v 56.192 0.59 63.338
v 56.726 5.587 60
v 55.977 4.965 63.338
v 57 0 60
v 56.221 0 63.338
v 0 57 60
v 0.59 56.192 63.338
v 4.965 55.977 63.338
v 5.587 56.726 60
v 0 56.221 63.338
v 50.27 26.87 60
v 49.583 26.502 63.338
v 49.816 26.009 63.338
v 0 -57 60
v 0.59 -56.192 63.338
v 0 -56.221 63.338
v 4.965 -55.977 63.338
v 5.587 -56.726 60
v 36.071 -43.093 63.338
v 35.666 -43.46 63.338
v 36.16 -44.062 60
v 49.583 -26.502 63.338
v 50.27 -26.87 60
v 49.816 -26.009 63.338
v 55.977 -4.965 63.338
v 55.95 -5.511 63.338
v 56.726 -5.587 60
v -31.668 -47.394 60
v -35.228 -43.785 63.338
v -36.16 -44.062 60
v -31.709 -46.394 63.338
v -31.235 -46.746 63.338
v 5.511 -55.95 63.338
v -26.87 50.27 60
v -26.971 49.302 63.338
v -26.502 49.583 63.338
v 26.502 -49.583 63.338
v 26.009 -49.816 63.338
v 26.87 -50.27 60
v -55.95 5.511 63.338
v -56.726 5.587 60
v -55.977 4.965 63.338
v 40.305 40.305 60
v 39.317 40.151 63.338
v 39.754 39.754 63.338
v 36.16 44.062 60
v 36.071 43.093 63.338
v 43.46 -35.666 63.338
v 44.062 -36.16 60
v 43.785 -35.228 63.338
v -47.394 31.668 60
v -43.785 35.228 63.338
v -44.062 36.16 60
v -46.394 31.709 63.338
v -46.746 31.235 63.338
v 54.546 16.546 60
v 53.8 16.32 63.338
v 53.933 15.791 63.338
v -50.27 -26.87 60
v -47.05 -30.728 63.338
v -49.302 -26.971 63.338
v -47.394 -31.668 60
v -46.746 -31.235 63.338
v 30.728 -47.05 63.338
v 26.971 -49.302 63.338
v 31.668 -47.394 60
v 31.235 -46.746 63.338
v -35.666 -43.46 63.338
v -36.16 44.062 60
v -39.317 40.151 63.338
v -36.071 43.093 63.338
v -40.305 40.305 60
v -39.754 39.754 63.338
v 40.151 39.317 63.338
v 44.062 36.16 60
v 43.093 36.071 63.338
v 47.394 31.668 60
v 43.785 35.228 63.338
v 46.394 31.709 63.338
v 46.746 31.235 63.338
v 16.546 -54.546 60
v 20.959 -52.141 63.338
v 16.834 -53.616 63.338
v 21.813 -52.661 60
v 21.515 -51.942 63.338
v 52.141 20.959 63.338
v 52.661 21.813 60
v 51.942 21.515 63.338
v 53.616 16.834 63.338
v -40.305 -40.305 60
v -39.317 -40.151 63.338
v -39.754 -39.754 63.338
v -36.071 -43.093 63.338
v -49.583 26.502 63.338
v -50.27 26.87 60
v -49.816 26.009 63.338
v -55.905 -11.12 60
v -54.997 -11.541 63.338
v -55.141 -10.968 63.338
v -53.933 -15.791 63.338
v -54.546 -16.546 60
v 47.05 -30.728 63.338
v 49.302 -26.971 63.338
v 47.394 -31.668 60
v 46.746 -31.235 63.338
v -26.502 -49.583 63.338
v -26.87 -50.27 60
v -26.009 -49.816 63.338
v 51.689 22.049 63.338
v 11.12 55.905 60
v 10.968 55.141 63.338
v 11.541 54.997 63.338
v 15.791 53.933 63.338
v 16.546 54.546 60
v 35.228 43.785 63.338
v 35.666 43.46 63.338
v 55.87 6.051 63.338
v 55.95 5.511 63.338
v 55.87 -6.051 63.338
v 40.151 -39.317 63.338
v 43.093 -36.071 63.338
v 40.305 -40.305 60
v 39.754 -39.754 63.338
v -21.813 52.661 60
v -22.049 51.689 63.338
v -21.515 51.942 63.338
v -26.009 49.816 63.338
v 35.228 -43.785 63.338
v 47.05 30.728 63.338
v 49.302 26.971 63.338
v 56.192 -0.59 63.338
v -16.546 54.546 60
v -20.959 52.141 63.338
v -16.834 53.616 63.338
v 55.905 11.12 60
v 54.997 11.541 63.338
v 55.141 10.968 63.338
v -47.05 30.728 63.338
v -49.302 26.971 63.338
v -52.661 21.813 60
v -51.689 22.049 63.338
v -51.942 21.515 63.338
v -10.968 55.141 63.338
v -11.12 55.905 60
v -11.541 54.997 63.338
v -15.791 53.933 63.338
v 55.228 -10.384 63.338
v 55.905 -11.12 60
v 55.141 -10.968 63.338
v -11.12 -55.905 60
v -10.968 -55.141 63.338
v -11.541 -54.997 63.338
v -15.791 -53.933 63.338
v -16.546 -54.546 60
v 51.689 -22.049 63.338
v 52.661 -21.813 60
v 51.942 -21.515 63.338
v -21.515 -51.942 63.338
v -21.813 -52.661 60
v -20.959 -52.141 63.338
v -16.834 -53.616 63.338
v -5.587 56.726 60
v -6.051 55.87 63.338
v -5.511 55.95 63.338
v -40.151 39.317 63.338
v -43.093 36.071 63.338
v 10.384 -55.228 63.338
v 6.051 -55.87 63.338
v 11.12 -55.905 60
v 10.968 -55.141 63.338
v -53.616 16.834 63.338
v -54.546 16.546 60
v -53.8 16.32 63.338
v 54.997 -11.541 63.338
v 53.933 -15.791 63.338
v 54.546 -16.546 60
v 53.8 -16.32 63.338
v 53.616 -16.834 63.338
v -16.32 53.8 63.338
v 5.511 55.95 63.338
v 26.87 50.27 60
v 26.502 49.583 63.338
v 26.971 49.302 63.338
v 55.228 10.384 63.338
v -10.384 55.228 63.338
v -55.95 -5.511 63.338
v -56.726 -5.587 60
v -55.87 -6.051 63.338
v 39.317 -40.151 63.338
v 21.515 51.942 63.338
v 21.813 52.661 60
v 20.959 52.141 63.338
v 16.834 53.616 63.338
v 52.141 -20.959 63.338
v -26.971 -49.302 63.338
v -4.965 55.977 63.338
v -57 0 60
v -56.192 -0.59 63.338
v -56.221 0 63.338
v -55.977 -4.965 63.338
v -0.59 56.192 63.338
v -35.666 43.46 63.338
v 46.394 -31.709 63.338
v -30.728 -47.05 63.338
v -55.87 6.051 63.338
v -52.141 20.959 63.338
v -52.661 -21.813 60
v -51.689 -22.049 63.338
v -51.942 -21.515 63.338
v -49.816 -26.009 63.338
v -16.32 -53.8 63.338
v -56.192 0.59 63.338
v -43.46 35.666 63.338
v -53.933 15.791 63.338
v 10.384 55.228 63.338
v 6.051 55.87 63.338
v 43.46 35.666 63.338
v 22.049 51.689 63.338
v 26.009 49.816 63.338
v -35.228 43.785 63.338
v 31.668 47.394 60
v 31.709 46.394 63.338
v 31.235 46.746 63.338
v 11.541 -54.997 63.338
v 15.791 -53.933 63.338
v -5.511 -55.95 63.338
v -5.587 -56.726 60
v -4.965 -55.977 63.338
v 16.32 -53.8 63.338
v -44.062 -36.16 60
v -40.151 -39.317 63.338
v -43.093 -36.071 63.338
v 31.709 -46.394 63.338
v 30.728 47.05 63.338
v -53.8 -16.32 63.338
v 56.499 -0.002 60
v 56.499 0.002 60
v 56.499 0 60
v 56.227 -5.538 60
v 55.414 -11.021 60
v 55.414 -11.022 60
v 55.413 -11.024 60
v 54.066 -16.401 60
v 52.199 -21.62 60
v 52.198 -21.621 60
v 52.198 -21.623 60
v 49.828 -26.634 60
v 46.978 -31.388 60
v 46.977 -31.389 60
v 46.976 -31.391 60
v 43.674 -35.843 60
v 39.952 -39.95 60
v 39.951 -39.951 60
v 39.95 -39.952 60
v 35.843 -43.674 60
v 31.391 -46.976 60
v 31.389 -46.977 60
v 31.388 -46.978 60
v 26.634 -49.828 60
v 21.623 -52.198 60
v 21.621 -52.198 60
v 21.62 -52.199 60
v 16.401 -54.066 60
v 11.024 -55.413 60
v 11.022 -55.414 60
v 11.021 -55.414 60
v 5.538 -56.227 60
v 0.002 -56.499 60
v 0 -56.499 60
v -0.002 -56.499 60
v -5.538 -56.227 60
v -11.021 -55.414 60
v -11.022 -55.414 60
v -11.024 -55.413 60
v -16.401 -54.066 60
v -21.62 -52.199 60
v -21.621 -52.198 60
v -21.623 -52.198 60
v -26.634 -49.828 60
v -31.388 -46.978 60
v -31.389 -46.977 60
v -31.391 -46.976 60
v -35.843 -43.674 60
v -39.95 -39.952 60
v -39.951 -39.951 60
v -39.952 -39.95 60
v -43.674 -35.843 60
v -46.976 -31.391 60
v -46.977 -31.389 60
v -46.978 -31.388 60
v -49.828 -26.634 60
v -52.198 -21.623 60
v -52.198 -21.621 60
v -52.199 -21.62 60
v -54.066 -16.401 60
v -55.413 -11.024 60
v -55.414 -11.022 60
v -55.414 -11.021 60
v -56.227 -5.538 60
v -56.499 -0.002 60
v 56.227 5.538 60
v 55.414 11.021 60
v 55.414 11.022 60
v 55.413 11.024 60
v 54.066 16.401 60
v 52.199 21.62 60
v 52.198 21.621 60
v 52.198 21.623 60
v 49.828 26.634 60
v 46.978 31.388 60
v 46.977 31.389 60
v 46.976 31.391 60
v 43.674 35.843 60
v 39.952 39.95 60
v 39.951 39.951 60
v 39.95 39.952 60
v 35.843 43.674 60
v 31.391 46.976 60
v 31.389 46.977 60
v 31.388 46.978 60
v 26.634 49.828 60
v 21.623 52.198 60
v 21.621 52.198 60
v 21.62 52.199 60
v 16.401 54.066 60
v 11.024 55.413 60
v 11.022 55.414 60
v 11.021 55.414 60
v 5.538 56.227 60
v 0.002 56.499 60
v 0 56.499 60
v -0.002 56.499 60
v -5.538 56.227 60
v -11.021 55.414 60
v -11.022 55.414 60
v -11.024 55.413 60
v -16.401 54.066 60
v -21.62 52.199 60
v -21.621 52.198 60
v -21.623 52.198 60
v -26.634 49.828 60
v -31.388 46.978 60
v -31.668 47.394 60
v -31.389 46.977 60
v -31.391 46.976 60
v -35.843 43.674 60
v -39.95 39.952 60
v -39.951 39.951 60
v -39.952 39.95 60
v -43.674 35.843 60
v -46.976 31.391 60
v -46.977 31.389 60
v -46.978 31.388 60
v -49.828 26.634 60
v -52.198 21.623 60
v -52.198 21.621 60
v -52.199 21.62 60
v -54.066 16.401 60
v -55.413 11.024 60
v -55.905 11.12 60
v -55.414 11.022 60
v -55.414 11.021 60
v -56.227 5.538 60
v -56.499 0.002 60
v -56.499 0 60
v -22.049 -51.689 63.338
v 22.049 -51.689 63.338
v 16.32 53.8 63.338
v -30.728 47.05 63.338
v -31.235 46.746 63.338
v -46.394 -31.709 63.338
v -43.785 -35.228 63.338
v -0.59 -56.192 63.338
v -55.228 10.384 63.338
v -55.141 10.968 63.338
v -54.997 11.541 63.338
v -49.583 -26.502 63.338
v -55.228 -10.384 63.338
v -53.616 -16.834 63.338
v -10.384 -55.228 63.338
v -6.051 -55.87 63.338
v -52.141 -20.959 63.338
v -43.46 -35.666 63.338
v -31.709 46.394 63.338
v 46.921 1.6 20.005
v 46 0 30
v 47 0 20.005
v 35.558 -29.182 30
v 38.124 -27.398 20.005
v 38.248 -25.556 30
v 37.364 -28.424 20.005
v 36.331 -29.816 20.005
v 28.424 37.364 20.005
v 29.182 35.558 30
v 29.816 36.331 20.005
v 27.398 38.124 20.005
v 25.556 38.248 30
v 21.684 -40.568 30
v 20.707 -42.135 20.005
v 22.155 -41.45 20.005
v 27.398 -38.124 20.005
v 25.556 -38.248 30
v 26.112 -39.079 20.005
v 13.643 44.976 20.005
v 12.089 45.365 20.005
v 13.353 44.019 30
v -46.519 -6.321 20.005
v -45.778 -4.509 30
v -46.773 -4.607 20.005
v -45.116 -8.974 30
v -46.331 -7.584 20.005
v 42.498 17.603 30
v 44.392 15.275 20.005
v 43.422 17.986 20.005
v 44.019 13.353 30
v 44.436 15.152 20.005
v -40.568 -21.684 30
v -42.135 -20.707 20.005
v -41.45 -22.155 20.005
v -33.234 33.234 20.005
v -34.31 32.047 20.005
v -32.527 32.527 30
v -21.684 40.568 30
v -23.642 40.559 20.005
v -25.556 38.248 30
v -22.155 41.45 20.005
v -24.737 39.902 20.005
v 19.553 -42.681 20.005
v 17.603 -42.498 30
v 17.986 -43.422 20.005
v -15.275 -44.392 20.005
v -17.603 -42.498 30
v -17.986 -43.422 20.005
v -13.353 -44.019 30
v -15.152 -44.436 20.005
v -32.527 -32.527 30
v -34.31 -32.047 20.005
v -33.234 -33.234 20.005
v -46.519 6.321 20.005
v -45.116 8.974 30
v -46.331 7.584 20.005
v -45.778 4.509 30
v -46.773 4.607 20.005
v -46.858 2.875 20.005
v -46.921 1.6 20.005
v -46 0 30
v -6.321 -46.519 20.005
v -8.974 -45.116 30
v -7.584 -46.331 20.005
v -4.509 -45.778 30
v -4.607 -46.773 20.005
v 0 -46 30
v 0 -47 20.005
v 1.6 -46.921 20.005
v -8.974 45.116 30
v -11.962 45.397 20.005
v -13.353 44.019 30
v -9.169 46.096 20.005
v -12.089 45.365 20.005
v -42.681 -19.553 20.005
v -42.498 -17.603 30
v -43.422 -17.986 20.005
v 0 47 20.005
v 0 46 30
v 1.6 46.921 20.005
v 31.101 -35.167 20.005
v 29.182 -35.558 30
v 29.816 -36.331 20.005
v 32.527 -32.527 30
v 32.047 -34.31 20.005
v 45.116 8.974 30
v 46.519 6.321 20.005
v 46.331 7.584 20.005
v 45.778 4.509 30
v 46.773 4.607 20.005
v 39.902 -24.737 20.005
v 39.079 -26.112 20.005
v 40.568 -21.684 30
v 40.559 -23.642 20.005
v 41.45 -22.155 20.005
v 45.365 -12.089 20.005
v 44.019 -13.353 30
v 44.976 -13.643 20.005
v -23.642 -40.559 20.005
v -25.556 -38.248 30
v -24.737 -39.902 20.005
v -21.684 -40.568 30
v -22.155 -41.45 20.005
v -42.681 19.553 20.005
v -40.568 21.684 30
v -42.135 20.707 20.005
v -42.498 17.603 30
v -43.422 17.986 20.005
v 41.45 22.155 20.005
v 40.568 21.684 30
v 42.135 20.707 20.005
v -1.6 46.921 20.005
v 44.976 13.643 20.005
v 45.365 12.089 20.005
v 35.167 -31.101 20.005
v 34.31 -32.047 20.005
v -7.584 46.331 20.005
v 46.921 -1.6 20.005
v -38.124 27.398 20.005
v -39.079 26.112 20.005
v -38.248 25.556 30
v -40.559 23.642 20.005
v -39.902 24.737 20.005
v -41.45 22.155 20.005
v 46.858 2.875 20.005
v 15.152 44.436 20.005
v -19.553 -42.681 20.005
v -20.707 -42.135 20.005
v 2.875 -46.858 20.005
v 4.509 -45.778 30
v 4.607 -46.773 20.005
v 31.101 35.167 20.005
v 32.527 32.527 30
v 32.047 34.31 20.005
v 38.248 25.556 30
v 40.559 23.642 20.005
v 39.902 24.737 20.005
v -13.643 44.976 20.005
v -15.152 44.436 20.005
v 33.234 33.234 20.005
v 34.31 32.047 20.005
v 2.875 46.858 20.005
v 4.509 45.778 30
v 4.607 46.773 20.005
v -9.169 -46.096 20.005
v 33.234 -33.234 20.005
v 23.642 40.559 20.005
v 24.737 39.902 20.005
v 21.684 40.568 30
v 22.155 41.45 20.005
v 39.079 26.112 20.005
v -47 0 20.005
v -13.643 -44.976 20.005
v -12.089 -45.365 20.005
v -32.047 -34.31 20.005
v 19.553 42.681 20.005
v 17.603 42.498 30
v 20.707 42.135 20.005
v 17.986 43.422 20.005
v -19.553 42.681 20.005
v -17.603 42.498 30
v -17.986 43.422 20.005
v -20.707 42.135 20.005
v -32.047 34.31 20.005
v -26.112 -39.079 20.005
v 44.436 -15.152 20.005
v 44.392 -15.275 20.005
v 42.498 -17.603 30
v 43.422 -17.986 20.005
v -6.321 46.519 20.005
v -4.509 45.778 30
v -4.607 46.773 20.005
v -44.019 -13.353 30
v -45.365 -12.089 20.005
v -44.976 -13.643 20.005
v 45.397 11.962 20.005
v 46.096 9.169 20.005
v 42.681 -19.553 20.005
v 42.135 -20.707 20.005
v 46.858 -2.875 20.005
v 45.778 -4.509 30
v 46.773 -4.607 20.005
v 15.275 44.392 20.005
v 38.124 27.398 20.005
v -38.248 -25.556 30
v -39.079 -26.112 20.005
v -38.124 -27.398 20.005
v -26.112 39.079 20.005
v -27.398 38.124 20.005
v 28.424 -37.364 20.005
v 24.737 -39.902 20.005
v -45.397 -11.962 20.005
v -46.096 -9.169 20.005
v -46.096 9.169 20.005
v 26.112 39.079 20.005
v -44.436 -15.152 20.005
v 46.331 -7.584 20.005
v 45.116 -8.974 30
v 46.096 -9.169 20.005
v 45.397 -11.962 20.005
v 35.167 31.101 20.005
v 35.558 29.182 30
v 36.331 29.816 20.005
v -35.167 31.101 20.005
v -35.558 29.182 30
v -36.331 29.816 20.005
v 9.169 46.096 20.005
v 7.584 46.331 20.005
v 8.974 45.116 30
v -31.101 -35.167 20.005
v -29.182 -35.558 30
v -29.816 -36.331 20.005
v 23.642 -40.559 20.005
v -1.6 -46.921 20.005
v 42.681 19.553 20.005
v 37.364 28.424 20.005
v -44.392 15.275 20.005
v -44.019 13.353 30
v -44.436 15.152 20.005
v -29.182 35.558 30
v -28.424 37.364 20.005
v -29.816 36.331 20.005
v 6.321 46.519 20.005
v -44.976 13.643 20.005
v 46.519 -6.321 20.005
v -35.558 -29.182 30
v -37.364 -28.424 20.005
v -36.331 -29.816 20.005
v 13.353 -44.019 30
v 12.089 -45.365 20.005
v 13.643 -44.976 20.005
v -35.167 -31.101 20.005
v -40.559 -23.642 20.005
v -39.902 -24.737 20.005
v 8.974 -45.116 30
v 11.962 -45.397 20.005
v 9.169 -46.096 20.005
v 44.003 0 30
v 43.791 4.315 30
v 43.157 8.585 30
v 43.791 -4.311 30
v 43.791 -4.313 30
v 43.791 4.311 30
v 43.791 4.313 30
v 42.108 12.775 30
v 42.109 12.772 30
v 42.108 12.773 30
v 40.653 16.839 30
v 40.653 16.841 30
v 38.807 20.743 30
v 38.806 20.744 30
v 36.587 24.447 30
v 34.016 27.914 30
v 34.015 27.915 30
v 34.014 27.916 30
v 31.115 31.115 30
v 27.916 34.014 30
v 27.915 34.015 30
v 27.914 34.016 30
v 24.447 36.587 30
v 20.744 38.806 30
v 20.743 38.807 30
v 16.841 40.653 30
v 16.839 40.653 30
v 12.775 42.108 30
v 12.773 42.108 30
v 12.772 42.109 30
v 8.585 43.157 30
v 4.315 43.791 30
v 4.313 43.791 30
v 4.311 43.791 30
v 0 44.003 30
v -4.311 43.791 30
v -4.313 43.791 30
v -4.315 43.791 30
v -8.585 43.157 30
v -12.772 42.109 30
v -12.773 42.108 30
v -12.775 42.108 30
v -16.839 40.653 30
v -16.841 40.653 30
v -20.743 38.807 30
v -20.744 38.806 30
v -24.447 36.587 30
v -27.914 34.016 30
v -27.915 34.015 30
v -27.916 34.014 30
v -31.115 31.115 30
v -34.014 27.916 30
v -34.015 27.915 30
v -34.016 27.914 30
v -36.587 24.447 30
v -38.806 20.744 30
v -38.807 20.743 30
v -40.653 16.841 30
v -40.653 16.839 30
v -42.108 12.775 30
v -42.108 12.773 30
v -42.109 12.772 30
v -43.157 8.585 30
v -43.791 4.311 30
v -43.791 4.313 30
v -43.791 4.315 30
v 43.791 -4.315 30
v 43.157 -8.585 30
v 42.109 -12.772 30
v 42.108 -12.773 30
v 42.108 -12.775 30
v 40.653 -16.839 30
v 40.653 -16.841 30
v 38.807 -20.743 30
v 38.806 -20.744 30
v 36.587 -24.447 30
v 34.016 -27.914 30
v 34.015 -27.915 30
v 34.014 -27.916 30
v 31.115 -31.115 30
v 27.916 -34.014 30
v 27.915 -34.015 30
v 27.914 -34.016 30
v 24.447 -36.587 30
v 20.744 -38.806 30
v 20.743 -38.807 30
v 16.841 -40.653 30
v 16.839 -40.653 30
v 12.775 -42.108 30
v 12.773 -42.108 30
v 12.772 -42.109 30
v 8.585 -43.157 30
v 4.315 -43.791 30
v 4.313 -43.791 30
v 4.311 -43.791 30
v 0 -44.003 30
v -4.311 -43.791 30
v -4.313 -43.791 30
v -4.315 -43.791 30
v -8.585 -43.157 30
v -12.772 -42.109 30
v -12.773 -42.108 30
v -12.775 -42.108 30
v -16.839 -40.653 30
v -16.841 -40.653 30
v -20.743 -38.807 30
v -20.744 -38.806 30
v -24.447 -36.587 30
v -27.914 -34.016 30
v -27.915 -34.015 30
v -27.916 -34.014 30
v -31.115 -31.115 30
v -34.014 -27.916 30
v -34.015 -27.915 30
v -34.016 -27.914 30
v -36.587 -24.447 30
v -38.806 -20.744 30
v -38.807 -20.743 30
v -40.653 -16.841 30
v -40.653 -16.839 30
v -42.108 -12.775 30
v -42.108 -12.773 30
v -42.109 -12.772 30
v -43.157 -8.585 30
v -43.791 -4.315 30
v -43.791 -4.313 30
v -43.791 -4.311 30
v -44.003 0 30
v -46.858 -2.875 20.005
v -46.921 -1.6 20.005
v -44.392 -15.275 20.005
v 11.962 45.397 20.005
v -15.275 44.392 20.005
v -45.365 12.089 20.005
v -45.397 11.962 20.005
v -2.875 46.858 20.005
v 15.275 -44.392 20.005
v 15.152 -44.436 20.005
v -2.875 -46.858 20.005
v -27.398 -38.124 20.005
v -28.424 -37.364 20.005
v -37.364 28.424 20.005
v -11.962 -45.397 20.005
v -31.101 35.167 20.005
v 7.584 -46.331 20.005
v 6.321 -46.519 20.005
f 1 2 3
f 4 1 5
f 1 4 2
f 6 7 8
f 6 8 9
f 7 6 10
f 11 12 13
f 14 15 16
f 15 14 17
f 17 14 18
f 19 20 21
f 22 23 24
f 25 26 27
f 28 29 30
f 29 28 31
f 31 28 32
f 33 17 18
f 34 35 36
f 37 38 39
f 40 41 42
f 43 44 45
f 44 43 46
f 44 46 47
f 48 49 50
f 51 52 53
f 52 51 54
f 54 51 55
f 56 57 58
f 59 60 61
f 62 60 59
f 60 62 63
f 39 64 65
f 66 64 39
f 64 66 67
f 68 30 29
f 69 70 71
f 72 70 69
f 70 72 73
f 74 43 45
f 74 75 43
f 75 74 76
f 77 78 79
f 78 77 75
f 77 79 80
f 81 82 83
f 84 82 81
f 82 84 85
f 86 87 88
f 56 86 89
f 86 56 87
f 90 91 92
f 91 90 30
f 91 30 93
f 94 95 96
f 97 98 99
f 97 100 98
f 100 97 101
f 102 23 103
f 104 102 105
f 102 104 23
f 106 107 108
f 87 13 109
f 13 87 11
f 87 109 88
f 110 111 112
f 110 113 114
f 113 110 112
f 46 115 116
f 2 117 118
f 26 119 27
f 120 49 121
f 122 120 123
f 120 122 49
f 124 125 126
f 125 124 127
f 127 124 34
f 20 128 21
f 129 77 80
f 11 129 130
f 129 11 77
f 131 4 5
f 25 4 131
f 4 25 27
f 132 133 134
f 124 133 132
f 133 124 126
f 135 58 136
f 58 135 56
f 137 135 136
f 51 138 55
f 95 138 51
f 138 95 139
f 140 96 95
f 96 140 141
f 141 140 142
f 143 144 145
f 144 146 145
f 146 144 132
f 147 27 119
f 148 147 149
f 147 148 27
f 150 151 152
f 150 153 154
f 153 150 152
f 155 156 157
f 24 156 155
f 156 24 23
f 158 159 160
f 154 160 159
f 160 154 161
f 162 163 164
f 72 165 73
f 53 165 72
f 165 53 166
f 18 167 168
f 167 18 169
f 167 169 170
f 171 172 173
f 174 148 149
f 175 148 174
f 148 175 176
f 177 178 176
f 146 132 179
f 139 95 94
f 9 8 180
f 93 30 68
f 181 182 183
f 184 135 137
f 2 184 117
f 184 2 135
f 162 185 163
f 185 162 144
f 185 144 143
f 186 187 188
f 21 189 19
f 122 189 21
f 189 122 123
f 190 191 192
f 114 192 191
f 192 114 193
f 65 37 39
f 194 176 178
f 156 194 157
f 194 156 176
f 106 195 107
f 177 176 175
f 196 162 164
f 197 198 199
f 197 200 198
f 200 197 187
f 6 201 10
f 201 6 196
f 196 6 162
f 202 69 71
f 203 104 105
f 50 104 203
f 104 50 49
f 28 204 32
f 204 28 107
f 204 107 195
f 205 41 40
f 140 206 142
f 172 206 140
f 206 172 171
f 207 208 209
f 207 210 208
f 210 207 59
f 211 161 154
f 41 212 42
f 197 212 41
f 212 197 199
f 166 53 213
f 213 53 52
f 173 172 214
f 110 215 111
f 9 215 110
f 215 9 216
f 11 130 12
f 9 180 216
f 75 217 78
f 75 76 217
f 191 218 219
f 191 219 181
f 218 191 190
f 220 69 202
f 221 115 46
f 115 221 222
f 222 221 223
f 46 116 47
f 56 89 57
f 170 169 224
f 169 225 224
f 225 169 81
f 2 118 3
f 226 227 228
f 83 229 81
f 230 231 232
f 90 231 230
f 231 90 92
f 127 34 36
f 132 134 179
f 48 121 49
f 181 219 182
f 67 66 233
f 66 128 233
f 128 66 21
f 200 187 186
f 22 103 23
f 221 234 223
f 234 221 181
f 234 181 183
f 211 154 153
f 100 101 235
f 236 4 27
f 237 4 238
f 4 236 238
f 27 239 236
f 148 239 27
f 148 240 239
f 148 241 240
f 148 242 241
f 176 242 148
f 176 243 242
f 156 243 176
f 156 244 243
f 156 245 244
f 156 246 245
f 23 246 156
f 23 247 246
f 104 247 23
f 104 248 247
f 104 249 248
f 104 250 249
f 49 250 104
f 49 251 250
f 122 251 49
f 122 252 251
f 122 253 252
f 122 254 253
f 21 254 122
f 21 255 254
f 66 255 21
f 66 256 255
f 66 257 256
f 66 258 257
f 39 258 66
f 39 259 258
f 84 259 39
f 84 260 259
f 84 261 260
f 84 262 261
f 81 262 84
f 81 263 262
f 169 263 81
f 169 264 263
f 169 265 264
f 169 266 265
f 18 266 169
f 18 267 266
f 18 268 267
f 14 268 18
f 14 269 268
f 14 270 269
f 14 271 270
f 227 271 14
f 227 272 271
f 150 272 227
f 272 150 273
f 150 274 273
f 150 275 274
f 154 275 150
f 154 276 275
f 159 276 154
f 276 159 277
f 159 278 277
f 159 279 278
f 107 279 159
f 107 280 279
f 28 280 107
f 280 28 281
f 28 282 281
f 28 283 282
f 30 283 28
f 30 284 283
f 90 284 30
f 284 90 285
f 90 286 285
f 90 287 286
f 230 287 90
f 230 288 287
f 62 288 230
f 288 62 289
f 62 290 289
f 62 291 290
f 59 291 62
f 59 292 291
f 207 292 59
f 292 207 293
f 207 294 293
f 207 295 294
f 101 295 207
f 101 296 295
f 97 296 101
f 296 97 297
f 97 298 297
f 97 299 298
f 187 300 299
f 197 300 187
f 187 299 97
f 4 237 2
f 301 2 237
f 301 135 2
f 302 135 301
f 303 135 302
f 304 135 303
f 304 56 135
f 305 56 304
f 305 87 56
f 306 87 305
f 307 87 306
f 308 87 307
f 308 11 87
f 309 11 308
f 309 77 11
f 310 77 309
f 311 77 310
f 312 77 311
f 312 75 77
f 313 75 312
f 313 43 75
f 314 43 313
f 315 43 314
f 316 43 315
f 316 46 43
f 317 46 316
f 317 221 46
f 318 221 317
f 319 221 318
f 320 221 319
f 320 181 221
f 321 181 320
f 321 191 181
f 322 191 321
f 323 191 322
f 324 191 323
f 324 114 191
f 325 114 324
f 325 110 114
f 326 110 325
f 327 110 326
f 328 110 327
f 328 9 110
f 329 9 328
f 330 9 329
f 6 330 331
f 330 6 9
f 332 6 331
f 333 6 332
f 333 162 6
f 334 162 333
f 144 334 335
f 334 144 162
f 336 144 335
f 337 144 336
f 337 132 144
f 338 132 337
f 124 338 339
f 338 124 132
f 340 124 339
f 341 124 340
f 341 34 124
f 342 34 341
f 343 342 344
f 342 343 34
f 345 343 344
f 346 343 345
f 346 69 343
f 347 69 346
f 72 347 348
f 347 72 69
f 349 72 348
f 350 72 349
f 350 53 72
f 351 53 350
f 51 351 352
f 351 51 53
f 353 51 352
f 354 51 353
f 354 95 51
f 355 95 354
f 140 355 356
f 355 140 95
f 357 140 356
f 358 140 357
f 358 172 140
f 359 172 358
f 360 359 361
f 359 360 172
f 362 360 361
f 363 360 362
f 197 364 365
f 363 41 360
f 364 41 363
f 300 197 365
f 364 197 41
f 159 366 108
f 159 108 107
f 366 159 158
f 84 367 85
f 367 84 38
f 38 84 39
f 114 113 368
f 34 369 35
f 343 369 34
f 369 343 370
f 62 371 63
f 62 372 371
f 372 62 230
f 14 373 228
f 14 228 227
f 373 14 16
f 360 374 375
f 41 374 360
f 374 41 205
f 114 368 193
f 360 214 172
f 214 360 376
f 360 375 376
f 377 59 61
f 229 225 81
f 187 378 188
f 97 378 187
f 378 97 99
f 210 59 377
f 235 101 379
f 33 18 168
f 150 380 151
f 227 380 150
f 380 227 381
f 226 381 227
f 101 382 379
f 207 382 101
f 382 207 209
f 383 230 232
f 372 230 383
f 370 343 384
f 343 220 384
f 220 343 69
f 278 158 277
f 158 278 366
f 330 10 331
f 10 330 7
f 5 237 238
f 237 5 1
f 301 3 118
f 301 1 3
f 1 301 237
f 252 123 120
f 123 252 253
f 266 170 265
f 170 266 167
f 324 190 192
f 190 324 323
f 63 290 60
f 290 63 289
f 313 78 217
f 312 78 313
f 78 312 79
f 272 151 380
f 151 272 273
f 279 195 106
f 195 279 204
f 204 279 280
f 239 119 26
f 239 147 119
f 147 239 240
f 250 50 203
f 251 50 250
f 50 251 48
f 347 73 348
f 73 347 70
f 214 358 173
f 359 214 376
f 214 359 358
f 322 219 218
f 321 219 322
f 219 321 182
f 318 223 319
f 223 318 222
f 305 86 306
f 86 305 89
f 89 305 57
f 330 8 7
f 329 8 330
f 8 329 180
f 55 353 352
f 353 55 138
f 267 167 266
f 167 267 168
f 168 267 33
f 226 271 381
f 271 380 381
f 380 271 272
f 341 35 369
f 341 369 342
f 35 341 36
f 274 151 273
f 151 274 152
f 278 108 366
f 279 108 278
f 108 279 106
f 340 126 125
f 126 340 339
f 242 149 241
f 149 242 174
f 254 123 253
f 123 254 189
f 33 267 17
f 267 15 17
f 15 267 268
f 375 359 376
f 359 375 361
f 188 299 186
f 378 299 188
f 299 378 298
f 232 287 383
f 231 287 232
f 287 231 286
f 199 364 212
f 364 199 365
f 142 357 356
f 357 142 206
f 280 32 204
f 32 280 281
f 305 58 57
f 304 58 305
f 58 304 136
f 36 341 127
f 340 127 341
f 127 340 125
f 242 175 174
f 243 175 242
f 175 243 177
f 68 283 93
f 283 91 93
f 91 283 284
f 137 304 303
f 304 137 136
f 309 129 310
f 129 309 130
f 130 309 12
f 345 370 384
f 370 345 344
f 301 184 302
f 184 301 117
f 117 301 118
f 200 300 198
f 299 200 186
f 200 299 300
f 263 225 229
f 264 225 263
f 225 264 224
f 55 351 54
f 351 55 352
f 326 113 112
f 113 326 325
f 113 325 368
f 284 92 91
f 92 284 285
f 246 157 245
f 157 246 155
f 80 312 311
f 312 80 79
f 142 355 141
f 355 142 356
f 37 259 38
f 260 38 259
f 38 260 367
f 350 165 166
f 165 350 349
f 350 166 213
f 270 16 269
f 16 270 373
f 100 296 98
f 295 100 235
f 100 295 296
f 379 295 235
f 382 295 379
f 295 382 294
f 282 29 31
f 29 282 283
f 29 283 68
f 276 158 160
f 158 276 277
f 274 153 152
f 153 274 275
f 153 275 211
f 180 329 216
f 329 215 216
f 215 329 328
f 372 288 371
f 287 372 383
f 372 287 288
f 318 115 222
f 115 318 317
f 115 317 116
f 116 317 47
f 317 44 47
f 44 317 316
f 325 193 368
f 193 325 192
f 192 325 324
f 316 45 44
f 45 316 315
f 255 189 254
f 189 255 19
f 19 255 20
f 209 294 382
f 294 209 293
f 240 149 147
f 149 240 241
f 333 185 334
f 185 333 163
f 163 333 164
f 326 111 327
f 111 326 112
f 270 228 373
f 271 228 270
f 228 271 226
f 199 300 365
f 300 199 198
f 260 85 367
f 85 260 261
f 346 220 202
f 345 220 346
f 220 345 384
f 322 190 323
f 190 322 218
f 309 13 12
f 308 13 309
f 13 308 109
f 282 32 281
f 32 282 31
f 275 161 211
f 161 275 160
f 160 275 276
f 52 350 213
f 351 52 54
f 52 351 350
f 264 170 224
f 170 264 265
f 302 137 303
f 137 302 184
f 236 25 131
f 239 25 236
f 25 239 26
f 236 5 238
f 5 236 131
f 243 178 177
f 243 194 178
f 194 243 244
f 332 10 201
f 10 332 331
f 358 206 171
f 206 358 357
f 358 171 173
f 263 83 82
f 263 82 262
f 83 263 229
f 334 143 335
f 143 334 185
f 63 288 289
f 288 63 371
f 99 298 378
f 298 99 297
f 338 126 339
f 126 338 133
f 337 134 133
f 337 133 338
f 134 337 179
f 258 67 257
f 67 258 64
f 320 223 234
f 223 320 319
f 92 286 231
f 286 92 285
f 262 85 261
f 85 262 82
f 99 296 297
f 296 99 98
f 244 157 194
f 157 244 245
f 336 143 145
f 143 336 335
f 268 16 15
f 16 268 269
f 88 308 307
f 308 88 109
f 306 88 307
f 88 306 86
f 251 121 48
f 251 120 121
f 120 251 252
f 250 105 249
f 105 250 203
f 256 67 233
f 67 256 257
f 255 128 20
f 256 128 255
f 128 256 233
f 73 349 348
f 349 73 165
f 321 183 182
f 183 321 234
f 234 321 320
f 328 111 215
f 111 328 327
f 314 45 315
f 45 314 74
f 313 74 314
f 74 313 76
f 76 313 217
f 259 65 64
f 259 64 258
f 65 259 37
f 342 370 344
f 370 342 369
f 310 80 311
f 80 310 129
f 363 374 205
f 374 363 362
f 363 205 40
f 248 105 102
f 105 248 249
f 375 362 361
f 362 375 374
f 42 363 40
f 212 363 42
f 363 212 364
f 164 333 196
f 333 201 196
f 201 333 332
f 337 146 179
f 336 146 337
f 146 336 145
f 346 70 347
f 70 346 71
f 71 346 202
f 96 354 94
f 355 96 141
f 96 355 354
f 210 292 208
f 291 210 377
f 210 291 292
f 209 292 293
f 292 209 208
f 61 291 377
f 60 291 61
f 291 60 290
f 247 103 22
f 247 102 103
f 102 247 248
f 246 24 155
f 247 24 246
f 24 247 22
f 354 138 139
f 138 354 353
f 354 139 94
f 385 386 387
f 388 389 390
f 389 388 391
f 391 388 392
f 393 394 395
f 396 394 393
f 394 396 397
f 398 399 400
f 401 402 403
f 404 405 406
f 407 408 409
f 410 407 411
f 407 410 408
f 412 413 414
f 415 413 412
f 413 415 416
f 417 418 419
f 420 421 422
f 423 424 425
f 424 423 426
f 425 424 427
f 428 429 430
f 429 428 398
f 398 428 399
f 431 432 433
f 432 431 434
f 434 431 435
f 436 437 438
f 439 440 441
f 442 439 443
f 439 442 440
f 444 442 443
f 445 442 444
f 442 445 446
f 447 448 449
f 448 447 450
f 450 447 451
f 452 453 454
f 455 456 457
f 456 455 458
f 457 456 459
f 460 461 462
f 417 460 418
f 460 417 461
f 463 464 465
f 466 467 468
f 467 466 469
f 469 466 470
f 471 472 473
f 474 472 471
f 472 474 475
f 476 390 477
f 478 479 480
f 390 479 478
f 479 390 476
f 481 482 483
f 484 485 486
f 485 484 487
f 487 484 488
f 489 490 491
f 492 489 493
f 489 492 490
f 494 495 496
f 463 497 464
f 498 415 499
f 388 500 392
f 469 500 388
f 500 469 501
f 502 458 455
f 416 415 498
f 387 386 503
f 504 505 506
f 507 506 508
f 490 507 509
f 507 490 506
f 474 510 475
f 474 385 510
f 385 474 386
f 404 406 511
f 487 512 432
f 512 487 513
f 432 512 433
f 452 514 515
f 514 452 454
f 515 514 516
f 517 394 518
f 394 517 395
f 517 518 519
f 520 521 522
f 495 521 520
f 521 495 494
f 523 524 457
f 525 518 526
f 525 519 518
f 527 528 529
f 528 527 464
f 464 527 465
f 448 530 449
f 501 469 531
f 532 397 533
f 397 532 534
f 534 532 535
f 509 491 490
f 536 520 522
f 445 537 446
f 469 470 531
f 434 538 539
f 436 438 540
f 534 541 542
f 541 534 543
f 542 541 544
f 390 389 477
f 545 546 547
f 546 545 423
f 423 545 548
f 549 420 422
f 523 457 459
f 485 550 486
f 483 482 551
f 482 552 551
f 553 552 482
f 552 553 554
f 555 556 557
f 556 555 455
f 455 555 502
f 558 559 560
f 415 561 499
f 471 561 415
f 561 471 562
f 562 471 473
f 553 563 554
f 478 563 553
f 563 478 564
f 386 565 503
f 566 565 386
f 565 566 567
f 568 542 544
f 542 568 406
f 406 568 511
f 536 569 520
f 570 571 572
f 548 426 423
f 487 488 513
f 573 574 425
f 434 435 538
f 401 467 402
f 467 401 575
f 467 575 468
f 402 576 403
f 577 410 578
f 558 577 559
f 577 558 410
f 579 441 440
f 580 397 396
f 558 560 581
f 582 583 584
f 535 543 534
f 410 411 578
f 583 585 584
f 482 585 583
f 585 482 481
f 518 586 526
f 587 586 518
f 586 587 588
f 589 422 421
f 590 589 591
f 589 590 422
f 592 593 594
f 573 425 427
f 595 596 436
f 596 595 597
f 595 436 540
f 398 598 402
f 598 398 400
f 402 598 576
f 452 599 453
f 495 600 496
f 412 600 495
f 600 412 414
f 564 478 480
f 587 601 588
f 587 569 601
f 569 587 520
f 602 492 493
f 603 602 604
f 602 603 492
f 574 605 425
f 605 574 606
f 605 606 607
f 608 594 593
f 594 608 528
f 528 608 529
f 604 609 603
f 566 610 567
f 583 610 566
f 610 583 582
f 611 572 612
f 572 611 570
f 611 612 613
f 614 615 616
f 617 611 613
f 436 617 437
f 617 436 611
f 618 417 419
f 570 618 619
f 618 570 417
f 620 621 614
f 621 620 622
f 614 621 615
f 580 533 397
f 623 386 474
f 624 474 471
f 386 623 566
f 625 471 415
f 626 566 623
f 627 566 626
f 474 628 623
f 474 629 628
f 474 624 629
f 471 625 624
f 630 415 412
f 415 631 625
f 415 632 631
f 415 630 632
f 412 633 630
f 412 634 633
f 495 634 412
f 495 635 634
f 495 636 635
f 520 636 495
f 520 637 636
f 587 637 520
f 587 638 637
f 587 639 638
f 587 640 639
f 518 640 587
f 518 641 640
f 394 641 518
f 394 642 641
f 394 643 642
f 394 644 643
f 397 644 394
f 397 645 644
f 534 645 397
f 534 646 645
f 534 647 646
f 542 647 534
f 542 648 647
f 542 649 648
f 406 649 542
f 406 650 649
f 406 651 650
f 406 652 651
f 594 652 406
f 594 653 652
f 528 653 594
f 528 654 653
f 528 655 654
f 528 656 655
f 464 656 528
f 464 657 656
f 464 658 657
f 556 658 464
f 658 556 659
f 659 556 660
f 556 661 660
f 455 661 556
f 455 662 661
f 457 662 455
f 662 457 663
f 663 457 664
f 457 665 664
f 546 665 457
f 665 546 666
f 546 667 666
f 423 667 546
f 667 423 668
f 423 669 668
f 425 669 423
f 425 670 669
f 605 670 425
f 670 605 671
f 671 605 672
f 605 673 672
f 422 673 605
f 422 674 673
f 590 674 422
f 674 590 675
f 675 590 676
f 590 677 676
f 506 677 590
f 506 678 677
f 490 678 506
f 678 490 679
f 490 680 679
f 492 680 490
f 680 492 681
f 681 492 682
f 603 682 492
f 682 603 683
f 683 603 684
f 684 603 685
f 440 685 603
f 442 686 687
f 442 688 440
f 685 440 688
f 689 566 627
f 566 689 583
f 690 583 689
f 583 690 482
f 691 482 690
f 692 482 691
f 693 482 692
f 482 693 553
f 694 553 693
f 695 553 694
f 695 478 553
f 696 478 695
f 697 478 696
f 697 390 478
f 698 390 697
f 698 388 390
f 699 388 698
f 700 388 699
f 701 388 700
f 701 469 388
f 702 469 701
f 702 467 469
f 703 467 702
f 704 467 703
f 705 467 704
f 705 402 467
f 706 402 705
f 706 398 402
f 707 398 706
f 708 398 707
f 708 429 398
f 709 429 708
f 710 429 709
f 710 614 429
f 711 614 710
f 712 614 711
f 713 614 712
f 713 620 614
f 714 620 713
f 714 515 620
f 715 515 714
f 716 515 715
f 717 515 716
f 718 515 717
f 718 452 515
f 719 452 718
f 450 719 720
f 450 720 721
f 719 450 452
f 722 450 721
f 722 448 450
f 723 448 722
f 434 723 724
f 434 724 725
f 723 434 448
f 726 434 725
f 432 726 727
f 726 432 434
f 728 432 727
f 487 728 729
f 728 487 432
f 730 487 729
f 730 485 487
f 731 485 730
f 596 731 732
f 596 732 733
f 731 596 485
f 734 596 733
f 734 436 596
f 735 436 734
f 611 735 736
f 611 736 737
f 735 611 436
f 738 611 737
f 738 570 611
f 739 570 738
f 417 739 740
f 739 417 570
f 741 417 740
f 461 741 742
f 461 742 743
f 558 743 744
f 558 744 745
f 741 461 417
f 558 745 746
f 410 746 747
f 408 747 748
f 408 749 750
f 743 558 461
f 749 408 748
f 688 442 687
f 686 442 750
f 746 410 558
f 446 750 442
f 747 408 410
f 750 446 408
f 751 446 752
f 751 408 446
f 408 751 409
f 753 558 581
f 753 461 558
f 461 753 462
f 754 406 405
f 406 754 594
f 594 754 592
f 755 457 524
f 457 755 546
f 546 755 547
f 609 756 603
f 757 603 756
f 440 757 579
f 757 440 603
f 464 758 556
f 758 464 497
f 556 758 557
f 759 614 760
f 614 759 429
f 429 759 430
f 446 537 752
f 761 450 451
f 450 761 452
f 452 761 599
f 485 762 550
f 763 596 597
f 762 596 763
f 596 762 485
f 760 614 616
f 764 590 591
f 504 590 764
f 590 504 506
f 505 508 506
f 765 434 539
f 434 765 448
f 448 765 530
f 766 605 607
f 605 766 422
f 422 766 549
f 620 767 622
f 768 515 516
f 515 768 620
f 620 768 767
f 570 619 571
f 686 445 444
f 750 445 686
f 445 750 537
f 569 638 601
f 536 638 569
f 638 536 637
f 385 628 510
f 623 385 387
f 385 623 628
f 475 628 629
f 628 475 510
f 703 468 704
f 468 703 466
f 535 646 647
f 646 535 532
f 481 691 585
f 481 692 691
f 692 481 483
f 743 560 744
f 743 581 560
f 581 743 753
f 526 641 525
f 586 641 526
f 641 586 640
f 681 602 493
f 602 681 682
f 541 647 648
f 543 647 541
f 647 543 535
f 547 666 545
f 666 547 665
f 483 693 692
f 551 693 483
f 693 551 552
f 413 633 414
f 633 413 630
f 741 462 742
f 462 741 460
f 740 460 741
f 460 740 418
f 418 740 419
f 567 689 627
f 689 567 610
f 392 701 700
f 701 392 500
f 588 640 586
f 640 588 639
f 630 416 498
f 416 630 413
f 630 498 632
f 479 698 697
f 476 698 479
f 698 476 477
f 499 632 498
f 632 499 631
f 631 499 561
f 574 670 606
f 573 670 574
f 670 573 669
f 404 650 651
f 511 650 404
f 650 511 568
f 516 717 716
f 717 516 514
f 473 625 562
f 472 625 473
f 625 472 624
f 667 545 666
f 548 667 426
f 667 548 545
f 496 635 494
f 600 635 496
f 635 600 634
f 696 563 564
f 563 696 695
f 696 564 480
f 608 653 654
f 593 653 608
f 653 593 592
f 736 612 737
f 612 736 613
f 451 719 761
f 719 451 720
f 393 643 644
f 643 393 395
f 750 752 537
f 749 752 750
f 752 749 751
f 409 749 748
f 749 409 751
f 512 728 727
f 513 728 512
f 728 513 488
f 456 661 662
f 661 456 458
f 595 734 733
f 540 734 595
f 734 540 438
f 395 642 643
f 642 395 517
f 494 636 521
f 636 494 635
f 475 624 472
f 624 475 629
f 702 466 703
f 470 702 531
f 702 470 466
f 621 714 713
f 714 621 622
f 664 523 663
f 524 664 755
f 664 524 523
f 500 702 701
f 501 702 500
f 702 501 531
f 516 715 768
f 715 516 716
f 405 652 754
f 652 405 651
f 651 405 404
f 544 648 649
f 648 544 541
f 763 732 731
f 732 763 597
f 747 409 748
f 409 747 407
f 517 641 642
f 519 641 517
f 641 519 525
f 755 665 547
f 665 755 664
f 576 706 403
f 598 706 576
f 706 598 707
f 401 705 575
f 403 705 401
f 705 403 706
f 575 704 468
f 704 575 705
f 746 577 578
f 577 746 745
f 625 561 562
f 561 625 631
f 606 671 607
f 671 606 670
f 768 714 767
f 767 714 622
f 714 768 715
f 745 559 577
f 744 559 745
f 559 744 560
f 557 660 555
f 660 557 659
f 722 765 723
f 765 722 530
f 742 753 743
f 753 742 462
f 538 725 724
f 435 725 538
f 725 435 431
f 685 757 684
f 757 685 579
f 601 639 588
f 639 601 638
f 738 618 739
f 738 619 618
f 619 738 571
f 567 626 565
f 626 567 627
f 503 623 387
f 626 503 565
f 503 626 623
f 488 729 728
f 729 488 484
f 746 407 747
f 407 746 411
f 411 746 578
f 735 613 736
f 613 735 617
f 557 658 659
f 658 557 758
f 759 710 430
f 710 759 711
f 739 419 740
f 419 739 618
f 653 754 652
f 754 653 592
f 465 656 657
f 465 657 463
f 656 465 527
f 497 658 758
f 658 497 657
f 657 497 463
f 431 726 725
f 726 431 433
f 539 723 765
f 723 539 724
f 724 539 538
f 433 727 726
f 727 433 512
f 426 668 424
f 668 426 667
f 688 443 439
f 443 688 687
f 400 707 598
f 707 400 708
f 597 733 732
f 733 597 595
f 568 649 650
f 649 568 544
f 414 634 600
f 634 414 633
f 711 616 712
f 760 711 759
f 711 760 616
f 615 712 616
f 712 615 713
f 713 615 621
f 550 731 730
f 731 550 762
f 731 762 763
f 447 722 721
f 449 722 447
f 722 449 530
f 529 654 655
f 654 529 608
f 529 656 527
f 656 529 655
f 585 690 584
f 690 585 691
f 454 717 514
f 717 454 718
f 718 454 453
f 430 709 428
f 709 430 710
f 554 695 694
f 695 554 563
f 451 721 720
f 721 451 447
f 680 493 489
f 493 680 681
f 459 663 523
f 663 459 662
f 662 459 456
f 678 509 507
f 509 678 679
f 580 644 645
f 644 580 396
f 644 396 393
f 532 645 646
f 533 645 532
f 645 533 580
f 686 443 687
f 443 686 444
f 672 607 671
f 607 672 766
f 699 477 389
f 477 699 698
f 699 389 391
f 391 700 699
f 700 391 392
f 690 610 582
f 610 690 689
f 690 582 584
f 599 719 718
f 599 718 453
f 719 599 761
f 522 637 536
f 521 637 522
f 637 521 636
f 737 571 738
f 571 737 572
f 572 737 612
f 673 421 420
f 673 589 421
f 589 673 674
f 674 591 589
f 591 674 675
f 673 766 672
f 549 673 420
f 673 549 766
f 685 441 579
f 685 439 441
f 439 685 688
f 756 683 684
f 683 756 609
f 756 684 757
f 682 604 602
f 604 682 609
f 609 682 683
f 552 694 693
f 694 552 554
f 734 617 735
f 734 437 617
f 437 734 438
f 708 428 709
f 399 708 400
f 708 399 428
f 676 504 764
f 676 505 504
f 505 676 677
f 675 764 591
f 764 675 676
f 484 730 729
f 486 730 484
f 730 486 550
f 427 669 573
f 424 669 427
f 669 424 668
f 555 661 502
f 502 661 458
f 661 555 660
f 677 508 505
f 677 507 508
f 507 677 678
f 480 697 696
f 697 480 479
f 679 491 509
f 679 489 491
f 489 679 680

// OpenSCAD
include <pw_primitives.scad>;

// AEG sander fitting diameters
d1=34.25; r1=d1/2;
d2=37.4;  r2=d2/2;
d3=55.0;  r3=d3/2;
d4=60.5;  r4=d4/2;
d5=64.5;  r5=d5/2;
d6=68.75; r6=d6/2;
// AEG sander fitting lengths
l1=6.1;
l2=11.5;
l3=15.0;
l4=20.0;
l5=30.0;
twist=1; // set to -1 for other direction
// Derived fitting measurements
t1=r2-r1;   // Thickness of wall
br=2.5;     // Locking ball radius
ba=15;      // Locking ball channel angle
// Hose attachment diameters and radii
dhi=34; rhi=dhi/2; 
dho=38; rho=dho/2;
spike_thick=1;  // Extra protrusion of 'spike' holding hose in place.
halen=30;
// Middle measurements
midlen=30;

$fn=64;
// AEG fitting
module aeg_hose_fitting_fitting() {
    translate([0, 0, halen+midlen]) union() {
        pipe_oi(l5, r2+t1, r2);
        // pipe_oi(3, r4, r2+t1);
        difference() {
            pipe_oi(l4, r6, r4);
            // +x side
            translate([0, 0, l2]) rotate([0, 0, 0]) union() {
                translate([r4, 0, 0]) cylinder(h=l4-l2+0.1,r=br);
                translate([r4, 0, 0]) sphere(r=br);
                rotate_extrude(angle=ba*twist) { translate([r4, 0, 0]) circle(r=br); }
                rotate([0, 0, ba*twist]) translate([r4, 0, 0]) sphere(r=br);
            }
            // -x side
            translate([0, 0, l2]) rotate([0, 0, 180]) union() {
                translate([r4, 0, 0]) cylinder(h=l4-l2+0.1,r=br);
                translate([r4, 0, 0]) sphere(r=br);
                rotate_extrude(angle=ba*twist) { translate([r4, 0, 0]) circle(r=br); }
                rotate([0, 0, ba*twist]) translate([r4, 0, 0]) sphere(r=br);
            }
        }
    }
    // Hose fitting
    hollow_cone_oi(halen/2, rho, rho+spike_thick, rhi, rhi);
    translate([0, 0, halen/2]) pipe_oi(halen/2, rho, rhi);
    // Middle
    translate([0, 0, halen]) hollow_cone_oi(midlen, rho, r6, rhi, r2);
}

module shopvac_silicone_hose_fitting() {
    translate([0, 0, 60]) hollow_cone_oi(30, 57, 56.5, 50, 54);
    translate([0, 0, 30]) hollow_cone_oi(30, 53, 57, 44, 50);
    translate([0, 0, 0]) hollow_cone_oi(30, 49, 53, 46, 44);
}

shopvac_silicone_hose_fitting();
